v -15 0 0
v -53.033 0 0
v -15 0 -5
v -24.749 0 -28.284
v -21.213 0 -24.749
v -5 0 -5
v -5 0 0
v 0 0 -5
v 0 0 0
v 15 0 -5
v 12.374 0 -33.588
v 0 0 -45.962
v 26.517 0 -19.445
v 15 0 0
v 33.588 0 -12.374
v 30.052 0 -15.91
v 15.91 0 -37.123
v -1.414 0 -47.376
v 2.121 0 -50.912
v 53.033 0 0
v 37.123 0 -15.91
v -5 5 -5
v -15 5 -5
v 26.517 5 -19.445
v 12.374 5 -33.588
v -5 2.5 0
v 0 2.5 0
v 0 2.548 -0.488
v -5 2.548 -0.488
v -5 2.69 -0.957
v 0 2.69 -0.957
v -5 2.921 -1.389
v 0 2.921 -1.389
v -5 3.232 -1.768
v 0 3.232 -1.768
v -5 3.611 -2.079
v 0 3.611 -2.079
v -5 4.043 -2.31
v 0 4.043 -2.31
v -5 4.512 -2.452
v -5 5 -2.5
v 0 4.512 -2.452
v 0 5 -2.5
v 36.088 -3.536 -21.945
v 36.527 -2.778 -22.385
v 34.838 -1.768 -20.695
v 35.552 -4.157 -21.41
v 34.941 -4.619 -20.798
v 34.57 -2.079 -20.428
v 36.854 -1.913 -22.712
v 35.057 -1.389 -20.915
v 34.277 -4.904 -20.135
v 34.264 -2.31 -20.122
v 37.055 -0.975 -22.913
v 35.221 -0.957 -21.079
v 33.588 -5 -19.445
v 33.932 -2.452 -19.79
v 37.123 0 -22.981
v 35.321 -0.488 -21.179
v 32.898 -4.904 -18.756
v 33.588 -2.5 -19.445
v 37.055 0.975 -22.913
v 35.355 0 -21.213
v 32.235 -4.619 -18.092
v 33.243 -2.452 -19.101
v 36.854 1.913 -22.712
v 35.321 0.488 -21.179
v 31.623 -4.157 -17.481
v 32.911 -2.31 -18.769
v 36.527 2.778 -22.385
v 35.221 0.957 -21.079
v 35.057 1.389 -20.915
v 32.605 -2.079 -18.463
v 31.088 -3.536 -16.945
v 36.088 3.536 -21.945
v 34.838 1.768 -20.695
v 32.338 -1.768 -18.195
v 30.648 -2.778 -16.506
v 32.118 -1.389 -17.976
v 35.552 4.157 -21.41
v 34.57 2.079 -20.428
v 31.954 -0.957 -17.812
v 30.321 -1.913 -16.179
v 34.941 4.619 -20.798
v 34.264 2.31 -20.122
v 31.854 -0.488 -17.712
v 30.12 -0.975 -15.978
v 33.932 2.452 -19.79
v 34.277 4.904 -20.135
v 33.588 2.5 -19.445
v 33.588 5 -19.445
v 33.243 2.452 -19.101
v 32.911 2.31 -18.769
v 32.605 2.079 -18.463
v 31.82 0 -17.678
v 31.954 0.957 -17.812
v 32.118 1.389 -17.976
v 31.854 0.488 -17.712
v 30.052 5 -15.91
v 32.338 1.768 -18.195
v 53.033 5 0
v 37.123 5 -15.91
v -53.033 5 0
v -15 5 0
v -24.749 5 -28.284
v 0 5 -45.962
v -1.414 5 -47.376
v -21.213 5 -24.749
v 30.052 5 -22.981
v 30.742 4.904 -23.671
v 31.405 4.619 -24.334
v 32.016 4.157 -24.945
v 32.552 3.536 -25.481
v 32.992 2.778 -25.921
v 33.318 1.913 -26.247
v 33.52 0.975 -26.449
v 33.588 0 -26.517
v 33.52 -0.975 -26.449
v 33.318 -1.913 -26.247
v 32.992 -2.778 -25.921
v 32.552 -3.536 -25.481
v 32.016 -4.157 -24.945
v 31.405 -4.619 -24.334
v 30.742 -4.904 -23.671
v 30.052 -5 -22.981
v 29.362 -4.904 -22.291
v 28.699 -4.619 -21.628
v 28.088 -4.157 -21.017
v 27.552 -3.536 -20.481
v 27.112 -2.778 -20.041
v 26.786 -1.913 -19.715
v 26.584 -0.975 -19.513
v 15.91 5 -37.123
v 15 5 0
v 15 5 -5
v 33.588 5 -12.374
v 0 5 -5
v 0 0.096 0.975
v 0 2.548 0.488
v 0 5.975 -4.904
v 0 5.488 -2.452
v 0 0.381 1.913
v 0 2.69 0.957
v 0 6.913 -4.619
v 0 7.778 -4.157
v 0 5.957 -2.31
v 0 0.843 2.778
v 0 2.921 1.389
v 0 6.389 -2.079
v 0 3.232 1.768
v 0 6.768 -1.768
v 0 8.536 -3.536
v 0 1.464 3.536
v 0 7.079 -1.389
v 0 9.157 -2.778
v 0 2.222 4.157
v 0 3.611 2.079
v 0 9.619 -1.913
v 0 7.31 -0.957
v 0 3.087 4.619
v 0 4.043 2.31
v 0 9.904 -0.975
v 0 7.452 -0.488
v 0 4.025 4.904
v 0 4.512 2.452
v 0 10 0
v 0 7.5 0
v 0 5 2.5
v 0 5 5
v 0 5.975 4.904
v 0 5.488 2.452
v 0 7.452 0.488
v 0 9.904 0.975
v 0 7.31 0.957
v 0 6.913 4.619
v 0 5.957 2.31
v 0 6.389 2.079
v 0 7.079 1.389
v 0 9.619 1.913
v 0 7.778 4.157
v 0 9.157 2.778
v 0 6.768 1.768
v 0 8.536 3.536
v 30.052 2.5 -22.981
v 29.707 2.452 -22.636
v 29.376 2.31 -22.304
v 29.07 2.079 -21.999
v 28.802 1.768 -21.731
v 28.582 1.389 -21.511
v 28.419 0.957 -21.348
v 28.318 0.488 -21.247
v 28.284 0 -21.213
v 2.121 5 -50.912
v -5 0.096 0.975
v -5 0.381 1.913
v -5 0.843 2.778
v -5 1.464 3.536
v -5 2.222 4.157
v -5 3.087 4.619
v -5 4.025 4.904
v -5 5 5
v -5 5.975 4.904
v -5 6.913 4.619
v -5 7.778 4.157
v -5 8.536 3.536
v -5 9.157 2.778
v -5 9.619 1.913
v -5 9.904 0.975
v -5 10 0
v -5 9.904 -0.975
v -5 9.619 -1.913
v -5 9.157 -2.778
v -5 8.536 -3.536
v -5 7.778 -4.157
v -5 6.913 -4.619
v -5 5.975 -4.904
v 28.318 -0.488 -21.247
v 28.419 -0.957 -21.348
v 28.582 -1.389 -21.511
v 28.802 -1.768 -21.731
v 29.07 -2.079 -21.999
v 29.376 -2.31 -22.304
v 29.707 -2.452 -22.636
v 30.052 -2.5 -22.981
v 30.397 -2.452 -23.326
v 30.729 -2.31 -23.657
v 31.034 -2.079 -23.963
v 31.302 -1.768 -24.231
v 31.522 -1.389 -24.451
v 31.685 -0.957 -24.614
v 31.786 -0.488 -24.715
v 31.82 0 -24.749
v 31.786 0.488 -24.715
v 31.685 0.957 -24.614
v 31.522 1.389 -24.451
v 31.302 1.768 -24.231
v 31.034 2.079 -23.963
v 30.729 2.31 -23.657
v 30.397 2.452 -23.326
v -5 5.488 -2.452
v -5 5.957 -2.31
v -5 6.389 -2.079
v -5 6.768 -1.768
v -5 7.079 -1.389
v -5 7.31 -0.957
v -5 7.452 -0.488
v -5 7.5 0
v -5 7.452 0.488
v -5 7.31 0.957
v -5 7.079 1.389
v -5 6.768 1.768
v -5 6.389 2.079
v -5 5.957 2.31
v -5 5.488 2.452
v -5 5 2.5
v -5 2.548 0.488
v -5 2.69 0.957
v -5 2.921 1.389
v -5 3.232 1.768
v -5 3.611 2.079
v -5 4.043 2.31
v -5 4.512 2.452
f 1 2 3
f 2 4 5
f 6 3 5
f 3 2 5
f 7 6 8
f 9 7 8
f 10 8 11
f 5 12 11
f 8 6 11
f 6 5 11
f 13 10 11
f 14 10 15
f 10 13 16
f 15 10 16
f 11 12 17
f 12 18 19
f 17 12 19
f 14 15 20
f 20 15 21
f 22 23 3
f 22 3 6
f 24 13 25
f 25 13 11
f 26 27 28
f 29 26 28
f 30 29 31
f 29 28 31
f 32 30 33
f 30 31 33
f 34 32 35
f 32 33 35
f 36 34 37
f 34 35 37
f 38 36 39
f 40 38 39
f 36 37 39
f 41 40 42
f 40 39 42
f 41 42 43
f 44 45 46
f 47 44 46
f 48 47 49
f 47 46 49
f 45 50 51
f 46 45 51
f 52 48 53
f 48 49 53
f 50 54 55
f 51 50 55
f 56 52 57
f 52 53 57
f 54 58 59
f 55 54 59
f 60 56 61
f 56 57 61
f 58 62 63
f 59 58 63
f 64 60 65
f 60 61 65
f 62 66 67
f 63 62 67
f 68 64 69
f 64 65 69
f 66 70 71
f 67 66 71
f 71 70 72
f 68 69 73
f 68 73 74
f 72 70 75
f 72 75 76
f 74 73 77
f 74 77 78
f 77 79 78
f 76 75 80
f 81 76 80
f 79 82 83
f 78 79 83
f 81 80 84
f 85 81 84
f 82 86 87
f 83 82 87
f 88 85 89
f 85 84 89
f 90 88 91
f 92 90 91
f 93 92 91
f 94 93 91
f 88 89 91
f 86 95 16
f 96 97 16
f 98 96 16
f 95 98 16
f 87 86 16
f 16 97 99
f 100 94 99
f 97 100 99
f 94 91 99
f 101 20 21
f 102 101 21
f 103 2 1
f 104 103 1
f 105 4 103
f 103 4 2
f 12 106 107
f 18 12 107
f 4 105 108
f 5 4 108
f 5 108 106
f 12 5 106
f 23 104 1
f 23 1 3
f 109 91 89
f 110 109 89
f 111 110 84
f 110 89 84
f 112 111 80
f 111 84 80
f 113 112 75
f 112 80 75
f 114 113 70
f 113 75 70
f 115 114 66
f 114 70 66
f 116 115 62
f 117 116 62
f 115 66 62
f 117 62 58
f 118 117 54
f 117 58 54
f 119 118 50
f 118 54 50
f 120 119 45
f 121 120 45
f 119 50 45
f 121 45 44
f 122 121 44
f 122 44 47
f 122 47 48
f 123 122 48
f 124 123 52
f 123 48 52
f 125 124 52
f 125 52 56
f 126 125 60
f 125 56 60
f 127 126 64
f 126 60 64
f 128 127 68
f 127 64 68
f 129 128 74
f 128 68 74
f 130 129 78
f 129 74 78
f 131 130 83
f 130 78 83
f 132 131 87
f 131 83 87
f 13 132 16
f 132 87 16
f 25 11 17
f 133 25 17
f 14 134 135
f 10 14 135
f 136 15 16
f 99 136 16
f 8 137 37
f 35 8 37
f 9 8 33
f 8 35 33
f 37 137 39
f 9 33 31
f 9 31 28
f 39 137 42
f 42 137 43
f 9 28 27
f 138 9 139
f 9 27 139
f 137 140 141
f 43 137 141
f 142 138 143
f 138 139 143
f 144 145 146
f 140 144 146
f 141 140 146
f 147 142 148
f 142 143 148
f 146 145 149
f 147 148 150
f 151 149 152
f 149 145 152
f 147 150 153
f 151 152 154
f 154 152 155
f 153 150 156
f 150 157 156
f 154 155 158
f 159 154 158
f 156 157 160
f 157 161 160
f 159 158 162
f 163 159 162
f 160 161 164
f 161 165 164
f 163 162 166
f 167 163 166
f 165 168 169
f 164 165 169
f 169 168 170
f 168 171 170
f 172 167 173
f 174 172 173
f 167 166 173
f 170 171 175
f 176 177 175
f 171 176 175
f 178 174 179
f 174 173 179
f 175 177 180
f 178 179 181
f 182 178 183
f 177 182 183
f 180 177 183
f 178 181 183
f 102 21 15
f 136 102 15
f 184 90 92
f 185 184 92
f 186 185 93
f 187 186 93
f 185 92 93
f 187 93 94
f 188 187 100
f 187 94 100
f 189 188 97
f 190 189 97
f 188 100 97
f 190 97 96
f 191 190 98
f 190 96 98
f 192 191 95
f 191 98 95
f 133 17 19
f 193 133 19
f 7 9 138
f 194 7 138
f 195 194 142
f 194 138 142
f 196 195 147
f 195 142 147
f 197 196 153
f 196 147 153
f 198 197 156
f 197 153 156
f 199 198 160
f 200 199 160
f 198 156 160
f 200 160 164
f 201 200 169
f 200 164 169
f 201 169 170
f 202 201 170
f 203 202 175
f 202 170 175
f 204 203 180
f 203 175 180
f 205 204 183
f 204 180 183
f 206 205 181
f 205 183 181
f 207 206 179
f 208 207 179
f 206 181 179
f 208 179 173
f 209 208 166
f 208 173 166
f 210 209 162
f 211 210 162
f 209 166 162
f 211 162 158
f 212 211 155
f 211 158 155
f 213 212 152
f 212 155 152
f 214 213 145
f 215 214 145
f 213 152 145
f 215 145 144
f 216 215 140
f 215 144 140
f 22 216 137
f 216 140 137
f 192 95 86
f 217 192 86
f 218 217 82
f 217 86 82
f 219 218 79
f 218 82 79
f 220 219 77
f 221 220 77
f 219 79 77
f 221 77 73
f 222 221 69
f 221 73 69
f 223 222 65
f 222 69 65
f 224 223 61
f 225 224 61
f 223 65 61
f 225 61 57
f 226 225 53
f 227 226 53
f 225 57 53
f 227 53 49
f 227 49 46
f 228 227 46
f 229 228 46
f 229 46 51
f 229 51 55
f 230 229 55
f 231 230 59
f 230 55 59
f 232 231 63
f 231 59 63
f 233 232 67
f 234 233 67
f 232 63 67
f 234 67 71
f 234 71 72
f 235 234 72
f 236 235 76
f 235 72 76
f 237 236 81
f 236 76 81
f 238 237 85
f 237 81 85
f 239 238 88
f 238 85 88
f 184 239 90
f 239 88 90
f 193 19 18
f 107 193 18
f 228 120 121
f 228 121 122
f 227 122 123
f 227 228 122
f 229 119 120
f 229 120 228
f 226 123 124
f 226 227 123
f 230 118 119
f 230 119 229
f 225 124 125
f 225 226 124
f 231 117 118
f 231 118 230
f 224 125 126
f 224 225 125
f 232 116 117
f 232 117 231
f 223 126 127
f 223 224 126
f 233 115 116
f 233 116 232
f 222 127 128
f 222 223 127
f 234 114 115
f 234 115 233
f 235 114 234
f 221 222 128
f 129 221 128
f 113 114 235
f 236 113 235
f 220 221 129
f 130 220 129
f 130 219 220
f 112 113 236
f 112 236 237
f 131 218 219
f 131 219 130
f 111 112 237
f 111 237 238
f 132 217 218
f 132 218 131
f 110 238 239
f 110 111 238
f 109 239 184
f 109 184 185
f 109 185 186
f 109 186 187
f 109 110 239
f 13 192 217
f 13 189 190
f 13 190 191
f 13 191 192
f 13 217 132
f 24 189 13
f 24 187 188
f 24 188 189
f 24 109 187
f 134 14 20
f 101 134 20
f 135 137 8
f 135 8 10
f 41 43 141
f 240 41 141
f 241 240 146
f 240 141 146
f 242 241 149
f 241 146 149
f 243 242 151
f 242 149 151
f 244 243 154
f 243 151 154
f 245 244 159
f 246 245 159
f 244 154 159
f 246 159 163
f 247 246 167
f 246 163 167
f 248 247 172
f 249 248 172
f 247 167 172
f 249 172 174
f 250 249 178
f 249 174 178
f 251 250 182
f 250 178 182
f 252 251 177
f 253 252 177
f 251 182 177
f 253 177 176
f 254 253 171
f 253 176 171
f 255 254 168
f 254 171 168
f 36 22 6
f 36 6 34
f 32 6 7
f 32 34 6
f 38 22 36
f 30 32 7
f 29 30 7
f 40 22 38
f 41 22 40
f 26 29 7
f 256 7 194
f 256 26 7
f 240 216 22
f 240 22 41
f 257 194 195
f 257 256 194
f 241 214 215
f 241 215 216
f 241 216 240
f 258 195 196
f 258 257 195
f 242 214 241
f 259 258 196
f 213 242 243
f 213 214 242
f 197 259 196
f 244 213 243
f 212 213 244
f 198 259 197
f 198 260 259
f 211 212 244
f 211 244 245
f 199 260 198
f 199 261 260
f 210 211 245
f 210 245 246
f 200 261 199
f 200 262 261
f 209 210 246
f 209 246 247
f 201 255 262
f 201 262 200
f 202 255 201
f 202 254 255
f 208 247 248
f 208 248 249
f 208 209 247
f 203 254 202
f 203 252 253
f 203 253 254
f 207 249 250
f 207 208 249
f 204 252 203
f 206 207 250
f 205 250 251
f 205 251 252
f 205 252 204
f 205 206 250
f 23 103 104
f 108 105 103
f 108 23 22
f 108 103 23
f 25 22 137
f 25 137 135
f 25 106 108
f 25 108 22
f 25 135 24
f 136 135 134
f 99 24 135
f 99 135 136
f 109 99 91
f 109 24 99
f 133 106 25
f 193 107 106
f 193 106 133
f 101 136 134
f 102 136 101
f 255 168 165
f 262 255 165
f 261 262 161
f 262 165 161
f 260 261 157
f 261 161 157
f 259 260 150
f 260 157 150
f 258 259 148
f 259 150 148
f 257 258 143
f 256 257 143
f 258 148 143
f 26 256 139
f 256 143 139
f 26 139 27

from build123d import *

# Parameters (mm, degrees)
BOSS_EXTRUDE1_DEPTH = 5
SKETCH2_W           = 30
SKETCH2_H           = 5
CUT_EXTRUDE1_DEPTH  = 5
CUT_EXTRUDE2_DEPTH  = 5
BOSS_EXTRUDE2_START = 15
BOSS_EXTRUDE2_DEPTH = 5
BOSS_EXTRUDE3_START = 5
BOSS_EXTRUDE3_DEPTH = 5
CUT_EXTRUDE3_DEPTH  = 10


with BuildPart() as part:
    # Sketch1 → Boss-Extrude1 (new body)
    with BuildSketch(Plane(origin=(0, 0, 0), x_dir=(1, 0, 0), z_dir=(0, 1, 0))):
        Polygon((-53.033008589, 0), (53.033008589, 0), (0, 53.033008589), align=None)
    extrude(amount=BOSS_EXTRUDE1_DEPTH)

    # Sketch2 → Cut-Extrude1 (cut)
    with BuildSketch(Plane(origin=(0, 5, 0), x_dir=(1, 0, 0), z_dir=(0, 1, 0))):
        with Locations((0, 2.5)):
            Rectangle(SKETCH2_W, SKETCH2_H)
        Polygon((-3.535533906, 49.497474683), (-24.748737342, 28.284271247), (-21.213203436, 24.748737342), (0, 45.961940777), align=None)
    extrude(amount=-CUT_EXTRUDE1_DEPTH, mode=Mode.SUBTRACT)

    # Sketch3 → Cut-Extrude2 (cut)
    with BuildSketch(Plane.XZ):
        Polygon((15.909902577, -37.123106012), (37.123106012, -15.909902577), (33.587572106, -12.374368671), (12.374368671, -33.587572106), align=None)
    extrude(amount=-CUT_EXTRUDE2_DEPTH, mode=Mode.SUBTRACT)

    # Sketch5 → Boss-Extrude2 (add)
    with BuildSketch(Plane.ZY.offset(-15).offset(BOSS_EXTRUDE2_START)):
        with BuildLine():
            Line((-2.5, 5), (-5, 5))
            ThreePointArc((-5, 5), (-3.535533906, 1.464466094), (0, 0))
            Line((0, 0), (0, 2.5))
            ThreePointArc((0, 2.5), (-1.767766953, 3.232233047), (-2.5, 5))
        make_face()
        with BuildLine():
            ThreePointArc((0, 0), (3.535533906, 1.464466094), (5, 5))
            ThreePointArc((5, 5), (0, 10), (-5, 5))
            Line((-5, 5), (-2.5, 5))
            ThreePointArc((-2.5, 5), (0, 7.5), (2.5, 5))
            ThreePointArc((2.5, 5), (1.767766953, 3.232233047), (0, 2.5))
            Line((0, 2.5), (0, 0))
        make_face()
        with BuildLine():
            ThreePointArc((0, 0), (-3.535533906, 1.464466094), (-5, 5))
            Line((-5, 5), (-5, 0))
            Line((-5, 0), (0, 0))
        make_face()
    extrude(amount=BOSS_EXTRUDE2_DEPTH)

    # Sketch6 → Boss-Extrude3 (add)
    with BuildSketch(Plane(origin=(10.606601718, 0, 10.606601718), x_dir=(-0.7071067811865478, 0, 0.7071067811865472), z_dir=(-0.7071067811865472, 0, -0.7071067811865478)).offset(BOSS_EXTRUDE3_START)):
        with BuildLine():
            ThreePointArc((-37.5, 5), (-41.035533906, -3.535533906), (-32.5, 0))
            Line((-32.5, 0), (-35, 0))
            ThreePointArc((-35, 0), (-39.267766953, -1.767766953), (-37.5, 2.5))
            Line((-37.5, 2.5), (-37.5, 5))
        make_face()
        with BuildLine():
            Line((-35, 0), (-32.5, 0))
            ThreePointArc((-32.5, 0), (-33.964466094, 3.535533906), (-37.5, 5))
            Line((-37.5, 5), (-37.5, 2.5))
            ThreePointArc((-37.5, 2.5), (-35.732233047, 1.767766953), (-35, 0))
        make_face()
        with BuildLine():
            ThreePointArc((-37.5, 5), (-33.964466094, 3.535533906), (-32.5, 0))
            Line((-32.5, 0), (-32.5, 5))
            Line((-32.5, 5), (-37.5, 5))
        make_face()
    extrude(amount=BOSS_EXTRUDE3_DEPTH)

    # Sketch7 → Cut-Extrude3 (cut)
    with BuildSketch(Plane.XZ):
        Polygon((-21.154129879, -31.87887871), (0, -53.033008589), (2.121320344, -50.911688245), (-19.032809536, -29.757558366), align=None)
    extrude(amount=-CUT_EXTRUDE3_DEPTH, mode=Mode.SUBTRACT)


solid = part.part
